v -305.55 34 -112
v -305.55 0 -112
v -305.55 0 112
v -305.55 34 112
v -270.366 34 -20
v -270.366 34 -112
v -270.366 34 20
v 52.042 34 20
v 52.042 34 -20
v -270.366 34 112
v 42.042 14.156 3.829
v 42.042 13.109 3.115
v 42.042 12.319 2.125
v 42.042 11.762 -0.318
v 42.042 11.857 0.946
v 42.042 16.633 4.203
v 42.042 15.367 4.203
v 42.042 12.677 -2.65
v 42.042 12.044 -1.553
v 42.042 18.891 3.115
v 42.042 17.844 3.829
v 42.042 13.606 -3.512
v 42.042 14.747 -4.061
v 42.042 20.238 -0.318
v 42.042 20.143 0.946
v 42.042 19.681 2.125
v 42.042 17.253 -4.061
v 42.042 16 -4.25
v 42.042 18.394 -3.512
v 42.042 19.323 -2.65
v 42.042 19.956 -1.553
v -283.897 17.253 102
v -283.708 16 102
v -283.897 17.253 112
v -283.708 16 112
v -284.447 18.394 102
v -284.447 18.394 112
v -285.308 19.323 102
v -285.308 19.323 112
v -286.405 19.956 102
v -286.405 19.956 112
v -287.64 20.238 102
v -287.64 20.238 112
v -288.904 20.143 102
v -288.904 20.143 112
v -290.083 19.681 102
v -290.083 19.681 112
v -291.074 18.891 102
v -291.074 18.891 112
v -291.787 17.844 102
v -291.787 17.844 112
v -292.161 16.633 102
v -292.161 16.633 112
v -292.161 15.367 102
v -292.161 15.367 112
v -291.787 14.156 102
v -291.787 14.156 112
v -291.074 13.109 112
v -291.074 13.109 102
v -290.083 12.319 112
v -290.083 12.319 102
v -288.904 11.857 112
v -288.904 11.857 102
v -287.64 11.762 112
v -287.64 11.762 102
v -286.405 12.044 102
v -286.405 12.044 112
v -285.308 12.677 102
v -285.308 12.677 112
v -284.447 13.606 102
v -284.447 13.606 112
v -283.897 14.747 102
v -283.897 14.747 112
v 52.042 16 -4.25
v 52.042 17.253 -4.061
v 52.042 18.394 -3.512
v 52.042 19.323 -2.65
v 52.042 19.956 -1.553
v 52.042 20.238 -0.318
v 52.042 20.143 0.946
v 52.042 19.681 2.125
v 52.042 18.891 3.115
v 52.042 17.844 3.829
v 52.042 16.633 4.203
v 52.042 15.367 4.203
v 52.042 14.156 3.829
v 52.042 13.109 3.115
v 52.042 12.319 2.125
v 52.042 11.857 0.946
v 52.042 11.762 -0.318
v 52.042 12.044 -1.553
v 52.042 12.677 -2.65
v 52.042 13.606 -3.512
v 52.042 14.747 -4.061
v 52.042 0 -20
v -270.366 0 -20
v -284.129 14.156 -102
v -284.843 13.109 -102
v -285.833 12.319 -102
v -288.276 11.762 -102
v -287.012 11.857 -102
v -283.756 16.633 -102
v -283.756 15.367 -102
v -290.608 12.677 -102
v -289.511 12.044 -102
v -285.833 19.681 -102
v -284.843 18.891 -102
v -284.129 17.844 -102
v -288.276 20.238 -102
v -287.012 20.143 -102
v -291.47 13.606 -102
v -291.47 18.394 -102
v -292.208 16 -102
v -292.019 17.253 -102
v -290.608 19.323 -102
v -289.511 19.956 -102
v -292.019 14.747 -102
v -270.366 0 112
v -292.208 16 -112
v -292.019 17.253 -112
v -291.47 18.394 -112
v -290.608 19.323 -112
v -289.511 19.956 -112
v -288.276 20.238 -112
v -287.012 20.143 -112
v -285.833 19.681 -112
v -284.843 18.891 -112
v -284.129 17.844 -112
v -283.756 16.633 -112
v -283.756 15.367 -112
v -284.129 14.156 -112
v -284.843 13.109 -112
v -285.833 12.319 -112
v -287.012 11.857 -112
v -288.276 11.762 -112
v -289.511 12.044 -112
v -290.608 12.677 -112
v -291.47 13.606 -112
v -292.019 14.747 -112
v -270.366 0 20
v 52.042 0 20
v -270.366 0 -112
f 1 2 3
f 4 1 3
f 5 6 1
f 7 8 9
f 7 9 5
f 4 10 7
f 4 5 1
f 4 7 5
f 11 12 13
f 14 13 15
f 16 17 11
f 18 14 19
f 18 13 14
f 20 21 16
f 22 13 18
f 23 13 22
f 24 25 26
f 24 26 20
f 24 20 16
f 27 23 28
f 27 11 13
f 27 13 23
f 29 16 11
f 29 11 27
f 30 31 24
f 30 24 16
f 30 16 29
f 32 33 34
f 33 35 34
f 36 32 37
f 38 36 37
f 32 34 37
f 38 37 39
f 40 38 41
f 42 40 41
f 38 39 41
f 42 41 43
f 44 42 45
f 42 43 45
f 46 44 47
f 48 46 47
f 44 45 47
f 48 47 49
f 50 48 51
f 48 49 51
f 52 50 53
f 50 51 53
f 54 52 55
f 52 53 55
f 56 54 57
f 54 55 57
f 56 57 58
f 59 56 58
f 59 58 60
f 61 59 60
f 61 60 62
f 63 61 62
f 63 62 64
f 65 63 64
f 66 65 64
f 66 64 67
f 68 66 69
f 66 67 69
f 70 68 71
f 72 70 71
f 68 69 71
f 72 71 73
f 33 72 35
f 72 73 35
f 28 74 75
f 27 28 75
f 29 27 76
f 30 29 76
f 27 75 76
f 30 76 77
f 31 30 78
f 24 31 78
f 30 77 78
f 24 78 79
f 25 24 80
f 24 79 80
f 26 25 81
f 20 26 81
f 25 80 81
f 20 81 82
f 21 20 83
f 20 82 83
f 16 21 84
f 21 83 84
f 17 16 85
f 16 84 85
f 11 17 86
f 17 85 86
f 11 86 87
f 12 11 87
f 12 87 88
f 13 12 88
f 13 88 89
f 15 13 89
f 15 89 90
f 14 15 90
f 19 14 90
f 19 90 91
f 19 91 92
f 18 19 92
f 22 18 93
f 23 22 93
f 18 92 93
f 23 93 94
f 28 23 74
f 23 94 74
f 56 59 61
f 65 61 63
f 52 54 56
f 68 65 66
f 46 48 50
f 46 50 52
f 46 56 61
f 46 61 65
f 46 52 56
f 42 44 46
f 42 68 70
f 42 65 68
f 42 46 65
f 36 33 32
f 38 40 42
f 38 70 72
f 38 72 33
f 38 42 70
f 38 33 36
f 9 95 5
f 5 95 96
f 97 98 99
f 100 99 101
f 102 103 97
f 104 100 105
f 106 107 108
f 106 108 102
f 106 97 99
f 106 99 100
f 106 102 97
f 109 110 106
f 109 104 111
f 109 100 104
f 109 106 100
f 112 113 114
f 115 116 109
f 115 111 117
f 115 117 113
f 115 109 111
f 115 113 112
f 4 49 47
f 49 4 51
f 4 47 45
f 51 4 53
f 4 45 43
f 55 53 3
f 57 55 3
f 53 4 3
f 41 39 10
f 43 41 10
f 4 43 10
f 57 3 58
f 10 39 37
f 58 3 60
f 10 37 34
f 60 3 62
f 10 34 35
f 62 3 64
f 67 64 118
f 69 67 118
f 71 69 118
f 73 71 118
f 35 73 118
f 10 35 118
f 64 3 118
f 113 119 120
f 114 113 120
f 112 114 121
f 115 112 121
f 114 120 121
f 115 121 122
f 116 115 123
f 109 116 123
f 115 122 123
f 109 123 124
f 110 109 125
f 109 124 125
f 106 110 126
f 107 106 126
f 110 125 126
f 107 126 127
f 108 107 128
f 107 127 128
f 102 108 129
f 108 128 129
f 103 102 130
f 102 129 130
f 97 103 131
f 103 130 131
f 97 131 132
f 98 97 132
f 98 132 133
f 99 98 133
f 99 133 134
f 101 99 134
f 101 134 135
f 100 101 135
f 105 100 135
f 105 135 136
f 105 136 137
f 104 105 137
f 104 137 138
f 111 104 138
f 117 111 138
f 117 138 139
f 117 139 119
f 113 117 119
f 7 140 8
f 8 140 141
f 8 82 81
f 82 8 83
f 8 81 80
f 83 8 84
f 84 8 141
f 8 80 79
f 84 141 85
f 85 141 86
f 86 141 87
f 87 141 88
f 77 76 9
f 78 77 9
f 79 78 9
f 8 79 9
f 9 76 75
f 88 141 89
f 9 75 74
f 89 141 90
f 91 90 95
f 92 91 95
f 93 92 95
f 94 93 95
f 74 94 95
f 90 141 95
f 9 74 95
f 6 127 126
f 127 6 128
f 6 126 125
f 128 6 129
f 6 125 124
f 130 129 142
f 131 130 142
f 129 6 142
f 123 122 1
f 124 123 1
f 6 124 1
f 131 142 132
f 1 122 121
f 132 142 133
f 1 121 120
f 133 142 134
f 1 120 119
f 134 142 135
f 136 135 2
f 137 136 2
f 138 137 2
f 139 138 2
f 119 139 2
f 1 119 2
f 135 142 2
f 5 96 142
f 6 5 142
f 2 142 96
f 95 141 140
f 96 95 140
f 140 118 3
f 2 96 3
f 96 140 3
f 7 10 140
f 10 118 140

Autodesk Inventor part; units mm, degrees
ref_plane "YZ Plane" through (0, 0, 0) normal (1, 0, 0) x (0, 1, 0)
ref_plane "XZ Plane" through (0, 0, 0) normal (0, 1, 0) x (-1, 0, 0)
ref_plane "XY Plane" through (0, 0, 0) normal (0, 0, 1) x (1, 0, 0)
sketch "Sketch1" plane through (0, 0, 0) normal (0, 1, 0) x (-1, 0, 0)
  line L0 (-52.0419, 20) -> (-52.0419, -20)
  line L1 (52.0419, 20) -> (-52.0419, -20) construction
  line L2 (-52.0419, 20) -> (52.0419, -20) construction
  line L3 (305.5497, 112) -> (270.3665, 112)
  line L4 (270.3665, -112) -> (305.5497, -112)
  line L5 (305.5497, -112) -> (305.5497, 112)
  line L6 (305.5497, 112) -> (270.3665, -112) construction
  line L7 (270.3665, 112) -> (305.5497, -112) construction
  line L8 (270.3665, 20) -> (-52.0419, 20)
  line L9 (270.3665, 112) -> (270.3665, 20)
  line L10 (270.3665, -20) -> (270.3665, -112)
  line L11 (-52.0419, -20) -> (270.3665, -20)
  point P0 (0, 0)
  point P1 (287.9581, 0)
  point P2 (-52.0419, 0)
  dimension "d17" = 224
  dimension "d19" = 40
  dimension "d20" = 340
extrude "Extrusion1" add sketch "Sketch1" along normal blind 34
sketch "Sketch2" plane through (-305.5497, 0, 112) normal (0, 0, 1) x (1, 0, 0)
  circle A0 centre (17.5916, 16) radius 4.25
  line L0 (0, 0) -> (35.1832, 0) projected
  line L1 (0, 0) -> (0, 34) projected
  point P0 (305.5497, 0)
  point P1 (17.5916, 0)
  dimension "d2" = 8.5
  dimension "d3" = 16
sketch "Sketch3" plane through (52.0419, 0, 20) normal (1, 0, 0) x (0, 0, -1)
  circle A0 centre (20, 16) radius 4.25
  line L0 (0, 0) -> (40, 0) projected
  line L1 (40, 0) -> (40, 34) projected
  point P0 (20, 0)
  point P1 (20, 0)
  dimension "d4" = 8.5
  dimension "d5" = 16
sketch "Sketch4" plane through (-270.3665, 0, -112) normal (0, 0, -1) x (-1, 0, 0)
  circle A0 centre (17.5916, 16) radius 4.25
  line L0 (0, 0) -> (35.1832, 0) projected
  line L1 (0, 0) -> (0, 34) projected
  point P0 (-270.3665, 0)
  point P1 (17.5916, 0)
  dimension "d6" = 8.5
  dimension "d7" = 16
extrude "Extrusion2" cut sketch "Sketch4" against normal blind 10
extrude "Extrusion3" cut sketch "Sketch2" against normal blind 10
extrude "Extrusion4" cut sketch "Sketch3" against normal blind 10
properties part number "T"
